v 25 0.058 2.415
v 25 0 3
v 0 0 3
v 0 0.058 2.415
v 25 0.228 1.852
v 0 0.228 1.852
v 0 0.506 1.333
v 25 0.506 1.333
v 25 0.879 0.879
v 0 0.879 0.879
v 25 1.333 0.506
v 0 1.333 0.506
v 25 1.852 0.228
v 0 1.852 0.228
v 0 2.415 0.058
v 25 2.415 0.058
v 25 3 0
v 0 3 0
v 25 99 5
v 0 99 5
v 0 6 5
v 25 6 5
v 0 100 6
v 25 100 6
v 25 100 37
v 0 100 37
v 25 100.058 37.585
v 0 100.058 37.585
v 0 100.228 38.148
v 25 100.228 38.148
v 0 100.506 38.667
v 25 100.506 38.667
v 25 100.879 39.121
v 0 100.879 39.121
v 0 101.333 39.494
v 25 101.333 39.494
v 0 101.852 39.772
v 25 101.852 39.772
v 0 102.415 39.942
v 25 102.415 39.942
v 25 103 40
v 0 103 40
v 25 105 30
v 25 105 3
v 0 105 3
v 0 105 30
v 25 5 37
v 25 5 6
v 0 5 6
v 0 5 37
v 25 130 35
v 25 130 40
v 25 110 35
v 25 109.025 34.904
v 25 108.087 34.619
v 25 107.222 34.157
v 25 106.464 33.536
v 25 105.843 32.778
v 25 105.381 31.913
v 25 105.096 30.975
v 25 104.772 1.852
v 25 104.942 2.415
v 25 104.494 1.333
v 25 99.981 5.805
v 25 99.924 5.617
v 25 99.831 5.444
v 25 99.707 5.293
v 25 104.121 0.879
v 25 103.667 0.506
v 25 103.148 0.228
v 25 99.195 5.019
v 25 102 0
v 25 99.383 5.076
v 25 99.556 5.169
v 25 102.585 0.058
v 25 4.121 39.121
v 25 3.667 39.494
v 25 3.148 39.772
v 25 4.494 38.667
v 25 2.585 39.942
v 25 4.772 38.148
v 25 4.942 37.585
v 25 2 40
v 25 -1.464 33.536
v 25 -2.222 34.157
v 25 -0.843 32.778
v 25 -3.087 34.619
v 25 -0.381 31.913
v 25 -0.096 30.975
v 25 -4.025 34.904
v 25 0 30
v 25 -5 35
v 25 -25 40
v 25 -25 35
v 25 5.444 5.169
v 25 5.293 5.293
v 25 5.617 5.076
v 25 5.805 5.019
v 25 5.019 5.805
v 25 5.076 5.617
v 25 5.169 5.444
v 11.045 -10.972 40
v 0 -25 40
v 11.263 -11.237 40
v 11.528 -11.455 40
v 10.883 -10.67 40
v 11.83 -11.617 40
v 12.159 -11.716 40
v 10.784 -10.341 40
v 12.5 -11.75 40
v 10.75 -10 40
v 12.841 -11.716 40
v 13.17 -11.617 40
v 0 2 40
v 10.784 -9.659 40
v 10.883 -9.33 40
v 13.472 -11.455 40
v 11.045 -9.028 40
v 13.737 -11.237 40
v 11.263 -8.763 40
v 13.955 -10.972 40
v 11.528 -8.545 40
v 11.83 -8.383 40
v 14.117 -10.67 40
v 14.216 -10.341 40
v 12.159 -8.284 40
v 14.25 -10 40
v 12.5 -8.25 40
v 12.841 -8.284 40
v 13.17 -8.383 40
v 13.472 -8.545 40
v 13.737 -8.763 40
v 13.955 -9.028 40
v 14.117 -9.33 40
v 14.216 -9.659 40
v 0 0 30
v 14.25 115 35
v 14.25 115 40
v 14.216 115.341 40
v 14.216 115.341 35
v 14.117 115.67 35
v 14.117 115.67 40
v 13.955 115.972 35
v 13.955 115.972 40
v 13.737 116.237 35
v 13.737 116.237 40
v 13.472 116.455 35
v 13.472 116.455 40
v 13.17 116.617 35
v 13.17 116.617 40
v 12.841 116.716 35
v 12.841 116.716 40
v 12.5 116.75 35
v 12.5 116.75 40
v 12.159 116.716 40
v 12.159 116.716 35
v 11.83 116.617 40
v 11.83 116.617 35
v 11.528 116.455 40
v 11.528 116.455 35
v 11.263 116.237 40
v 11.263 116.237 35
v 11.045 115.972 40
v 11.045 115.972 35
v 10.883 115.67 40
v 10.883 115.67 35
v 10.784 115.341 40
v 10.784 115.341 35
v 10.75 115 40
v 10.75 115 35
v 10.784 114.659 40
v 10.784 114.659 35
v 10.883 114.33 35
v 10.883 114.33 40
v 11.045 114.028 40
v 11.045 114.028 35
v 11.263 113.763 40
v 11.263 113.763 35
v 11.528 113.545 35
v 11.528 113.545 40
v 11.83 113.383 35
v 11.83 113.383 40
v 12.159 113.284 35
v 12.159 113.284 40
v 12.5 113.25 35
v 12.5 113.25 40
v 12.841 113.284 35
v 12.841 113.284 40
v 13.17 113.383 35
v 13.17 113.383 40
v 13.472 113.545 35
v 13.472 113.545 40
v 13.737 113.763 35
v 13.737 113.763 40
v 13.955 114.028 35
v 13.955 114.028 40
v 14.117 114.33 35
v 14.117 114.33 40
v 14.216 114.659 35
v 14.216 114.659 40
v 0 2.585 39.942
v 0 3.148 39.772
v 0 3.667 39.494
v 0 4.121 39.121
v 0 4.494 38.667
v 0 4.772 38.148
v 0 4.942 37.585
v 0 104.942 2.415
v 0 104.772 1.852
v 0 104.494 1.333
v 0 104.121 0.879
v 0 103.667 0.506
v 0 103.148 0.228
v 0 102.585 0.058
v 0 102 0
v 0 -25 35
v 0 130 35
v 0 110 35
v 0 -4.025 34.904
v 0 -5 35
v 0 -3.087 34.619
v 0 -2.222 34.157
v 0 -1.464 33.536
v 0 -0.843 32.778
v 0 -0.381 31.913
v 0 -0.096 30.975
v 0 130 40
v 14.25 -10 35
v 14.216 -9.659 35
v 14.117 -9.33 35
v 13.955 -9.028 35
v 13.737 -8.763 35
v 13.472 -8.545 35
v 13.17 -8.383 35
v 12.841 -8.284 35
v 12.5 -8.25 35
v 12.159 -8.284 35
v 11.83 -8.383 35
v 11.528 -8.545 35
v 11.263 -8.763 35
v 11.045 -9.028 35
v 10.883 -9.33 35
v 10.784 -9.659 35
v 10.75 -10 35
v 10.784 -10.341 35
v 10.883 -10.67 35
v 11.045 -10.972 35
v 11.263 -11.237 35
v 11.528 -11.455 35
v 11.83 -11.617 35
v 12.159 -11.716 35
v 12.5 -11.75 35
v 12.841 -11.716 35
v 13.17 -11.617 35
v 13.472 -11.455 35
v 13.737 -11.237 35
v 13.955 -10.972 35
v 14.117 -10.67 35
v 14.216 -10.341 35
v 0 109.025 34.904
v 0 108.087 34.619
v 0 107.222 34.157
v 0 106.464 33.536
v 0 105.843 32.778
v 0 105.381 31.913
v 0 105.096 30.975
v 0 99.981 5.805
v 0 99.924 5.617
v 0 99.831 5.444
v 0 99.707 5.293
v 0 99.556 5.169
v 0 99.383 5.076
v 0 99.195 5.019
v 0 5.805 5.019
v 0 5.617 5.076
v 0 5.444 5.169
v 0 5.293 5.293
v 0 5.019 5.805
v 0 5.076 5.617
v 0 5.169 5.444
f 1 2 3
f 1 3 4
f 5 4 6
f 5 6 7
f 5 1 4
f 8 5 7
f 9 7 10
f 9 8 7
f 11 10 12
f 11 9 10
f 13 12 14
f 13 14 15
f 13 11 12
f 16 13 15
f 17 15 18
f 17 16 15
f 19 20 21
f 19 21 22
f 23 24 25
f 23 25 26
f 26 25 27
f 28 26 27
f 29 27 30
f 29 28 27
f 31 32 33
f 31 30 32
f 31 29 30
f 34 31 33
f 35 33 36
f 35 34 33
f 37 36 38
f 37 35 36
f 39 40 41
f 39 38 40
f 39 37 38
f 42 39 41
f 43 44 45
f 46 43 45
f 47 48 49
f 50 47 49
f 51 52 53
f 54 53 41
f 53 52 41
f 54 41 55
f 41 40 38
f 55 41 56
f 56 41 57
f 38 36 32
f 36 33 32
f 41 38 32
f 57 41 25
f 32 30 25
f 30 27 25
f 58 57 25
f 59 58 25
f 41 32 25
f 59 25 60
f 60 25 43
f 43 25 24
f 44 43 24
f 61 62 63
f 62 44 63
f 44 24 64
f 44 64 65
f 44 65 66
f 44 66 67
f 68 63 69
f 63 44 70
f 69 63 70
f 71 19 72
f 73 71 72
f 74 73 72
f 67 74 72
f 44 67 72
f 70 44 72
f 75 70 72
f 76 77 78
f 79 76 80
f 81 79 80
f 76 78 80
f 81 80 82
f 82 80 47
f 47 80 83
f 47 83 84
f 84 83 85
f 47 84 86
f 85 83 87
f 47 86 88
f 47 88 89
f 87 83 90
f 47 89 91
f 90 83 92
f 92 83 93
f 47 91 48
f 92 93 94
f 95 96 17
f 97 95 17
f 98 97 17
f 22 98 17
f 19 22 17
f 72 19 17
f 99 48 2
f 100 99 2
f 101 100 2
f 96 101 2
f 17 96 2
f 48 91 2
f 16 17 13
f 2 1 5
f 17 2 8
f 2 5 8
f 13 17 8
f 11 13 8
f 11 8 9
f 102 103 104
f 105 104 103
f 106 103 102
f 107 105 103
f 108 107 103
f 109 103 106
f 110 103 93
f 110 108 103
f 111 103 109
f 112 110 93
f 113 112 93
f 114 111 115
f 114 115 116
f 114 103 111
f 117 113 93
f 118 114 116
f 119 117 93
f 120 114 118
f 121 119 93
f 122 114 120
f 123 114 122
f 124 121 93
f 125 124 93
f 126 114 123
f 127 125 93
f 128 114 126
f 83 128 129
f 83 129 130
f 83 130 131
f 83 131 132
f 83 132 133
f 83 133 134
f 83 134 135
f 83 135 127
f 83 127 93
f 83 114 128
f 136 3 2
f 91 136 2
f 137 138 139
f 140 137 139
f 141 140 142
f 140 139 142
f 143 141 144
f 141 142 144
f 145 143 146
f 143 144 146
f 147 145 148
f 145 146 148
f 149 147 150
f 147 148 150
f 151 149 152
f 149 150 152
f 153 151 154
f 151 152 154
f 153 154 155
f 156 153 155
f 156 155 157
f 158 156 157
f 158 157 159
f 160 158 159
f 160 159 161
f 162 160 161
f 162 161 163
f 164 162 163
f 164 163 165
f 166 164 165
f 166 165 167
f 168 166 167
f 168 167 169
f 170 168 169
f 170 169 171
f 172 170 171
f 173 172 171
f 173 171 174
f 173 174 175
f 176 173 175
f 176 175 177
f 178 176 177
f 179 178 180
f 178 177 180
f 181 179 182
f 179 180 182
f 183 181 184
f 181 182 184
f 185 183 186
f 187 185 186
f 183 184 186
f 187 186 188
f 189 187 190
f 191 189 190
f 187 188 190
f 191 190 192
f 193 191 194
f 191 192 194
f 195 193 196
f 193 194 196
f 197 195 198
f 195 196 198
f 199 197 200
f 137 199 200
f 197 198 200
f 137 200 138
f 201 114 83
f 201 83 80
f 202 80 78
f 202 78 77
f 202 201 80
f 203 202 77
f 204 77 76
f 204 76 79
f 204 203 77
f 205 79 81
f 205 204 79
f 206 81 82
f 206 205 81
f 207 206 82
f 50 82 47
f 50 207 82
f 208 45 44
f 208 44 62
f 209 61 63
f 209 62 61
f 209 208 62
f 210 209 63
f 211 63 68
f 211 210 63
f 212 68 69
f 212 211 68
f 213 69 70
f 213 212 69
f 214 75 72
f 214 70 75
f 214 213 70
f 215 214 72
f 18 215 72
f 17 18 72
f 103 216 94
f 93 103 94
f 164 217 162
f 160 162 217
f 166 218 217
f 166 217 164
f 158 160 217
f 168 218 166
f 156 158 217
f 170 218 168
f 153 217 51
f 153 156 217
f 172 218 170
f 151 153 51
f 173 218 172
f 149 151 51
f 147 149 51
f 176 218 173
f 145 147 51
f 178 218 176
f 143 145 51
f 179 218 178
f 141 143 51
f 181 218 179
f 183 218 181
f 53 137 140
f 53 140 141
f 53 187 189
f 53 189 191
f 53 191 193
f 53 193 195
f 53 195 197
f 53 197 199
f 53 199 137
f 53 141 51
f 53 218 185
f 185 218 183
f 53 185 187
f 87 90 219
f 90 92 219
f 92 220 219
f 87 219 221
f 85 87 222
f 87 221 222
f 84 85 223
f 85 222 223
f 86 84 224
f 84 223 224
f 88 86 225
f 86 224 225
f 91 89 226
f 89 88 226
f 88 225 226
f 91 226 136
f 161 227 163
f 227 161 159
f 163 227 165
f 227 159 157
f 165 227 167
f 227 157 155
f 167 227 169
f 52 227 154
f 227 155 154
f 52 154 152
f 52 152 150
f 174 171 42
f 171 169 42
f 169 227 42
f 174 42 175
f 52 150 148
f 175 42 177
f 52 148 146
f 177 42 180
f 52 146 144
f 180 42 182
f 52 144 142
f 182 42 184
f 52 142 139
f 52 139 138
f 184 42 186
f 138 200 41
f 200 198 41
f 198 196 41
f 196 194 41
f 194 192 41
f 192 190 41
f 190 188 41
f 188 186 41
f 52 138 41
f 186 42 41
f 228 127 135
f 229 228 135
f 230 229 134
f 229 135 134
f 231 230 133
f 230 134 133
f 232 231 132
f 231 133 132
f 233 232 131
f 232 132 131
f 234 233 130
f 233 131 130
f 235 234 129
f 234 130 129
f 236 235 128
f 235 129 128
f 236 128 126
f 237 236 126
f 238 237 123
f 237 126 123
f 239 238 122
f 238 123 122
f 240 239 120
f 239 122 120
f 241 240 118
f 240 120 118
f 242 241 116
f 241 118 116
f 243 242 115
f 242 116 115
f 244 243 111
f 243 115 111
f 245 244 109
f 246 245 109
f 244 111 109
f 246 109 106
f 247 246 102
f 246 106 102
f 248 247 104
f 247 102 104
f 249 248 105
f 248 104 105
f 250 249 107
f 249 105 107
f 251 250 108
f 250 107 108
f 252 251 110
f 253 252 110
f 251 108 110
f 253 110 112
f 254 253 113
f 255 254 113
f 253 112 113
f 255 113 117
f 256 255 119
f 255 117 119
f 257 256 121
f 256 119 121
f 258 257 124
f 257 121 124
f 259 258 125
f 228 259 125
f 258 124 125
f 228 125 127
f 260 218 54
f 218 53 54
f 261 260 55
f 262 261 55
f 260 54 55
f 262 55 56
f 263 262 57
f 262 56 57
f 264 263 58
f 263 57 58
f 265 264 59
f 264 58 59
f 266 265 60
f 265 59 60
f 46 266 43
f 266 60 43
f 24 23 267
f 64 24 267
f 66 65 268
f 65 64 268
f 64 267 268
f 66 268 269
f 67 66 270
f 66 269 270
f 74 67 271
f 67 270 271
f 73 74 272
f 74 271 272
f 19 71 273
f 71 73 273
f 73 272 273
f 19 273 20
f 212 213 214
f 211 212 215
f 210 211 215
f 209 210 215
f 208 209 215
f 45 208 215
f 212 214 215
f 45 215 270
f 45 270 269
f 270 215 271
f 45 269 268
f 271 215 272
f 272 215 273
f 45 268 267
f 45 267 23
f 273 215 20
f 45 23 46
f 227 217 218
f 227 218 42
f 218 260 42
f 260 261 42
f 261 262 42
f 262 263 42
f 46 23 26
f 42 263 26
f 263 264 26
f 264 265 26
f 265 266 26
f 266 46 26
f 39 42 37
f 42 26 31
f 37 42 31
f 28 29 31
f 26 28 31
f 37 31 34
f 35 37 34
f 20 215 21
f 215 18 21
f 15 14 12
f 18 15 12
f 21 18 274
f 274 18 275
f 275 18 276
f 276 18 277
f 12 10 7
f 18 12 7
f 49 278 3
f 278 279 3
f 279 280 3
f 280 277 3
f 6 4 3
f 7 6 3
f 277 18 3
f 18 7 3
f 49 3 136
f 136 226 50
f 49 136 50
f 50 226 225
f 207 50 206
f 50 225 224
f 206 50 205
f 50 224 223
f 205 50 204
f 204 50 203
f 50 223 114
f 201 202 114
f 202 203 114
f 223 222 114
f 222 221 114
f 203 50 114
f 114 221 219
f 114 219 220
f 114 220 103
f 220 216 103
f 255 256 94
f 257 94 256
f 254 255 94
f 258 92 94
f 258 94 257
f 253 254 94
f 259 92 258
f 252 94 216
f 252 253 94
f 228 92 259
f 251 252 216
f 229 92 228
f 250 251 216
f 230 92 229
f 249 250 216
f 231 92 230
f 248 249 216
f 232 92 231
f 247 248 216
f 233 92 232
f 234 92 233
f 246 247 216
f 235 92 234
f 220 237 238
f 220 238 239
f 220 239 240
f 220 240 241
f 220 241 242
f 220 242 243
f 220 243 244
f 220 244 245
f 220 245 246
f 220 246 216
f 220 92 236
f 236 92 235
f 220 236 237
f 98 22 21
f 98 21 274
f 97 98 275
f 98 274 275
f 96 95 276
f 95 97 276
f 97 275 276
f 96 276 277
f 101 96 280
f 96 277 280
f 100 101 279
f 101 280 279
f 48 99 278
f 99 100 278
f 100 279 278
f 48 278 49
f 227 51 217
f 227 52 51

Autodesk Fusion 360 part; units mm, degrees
sketch "Boceto1" plane through (0, 0, 0) normal (0, 1, 0) x (1, 0, 0)
sketch "Boceto2" plane through (0, 0, 0) normal (0, 0, 1) x (1, 0, 0)
  line L0 (0, 0) -> (0, 90)
  line L1 (0, 90) -> (25, 90)
  line L2 (0, 0) -> (25, 0)
  line L3 (25, 0) -> (25, 90)
  line L4 (25, 90) -> (25, 92)
  line L5 (25, 90) -> (25, 105)
  line L6 (25, 105) -> (0, 105)
  line L7 (0, 105) -> (0, 90)
  dimension "d1" = 90
  dimension "d2" = 25
  dimension "d4" = 15
extrude "Extruir1" add sketch "Boceto2" along normal blind 5
sketch "Boceto3" plane through (0, 0, 5) normal (0, 0, 1) x (1, 0, 0)
  line L0 (0, 0) -> (25, 0)
  line L1 (25, 0) -> (25, 105)
  line L2 (25, 105) -> (0, 105)
  line L3 (0, 105) -> (0, 0)
  line L4 (0, 0) -> (25, 0)
  line L5 (25, 0) -> (25, 5)
  line L6 (25, 5) -> (0, 5)
  line L7 (0, 5) -> (0, 0)
  line L8 (0, 105) -> (25, 105)
  line L9 (25, 105) -> (25, 100)
  line L10 (25, 100) -> (0, 100)
  line L11 (0, 100) -> (0, 105)
  dimension "d7" = 5
  dimension "d8" = 5
extrude "Extruir2" add sketch "Boceto3" along normal blind 35 contours L0 L1 L3 L4 L5 L6 L7 | L1 L2 L3 L8 L9 L10 L11
sketch "Boceto4" plane through (0, 0, 0) normal (0, 1, 0) x (1, 0, 0)
  line L0 (0, -40) -> (25, -40)
  line L1 (25, -40) -> (25, -35)
  line L2 (25, -35) -> (0, -35)
  line L3 (0, -35) -> (0, -40)
  dimension "d11" = 5
extrude "Extruir3" add sketch "Boceto4" against normal blind 25
sketch "Boceto5" plane through (0, 105, 0) normal (0, 1, 0) x (-1, 0, 0)
  line L0 (-25, 0) -> (0, 0)
  line L1 (0, 0) -> (0, 40)
  line L2 (0, 40) -> (-25, 40)
  line L3 (-25, 40) -> (-25, 0)
  line L4 (-25, 40) -> (0, 40)
  line L5 (0, 40) -> (0, 35)
  line L6 (0, 35) -> (-25, 35)
  line L7 (-25, 35) -> (-25, 40)
extrude "Extruir4" add sketch "Boceto5" along normal blind 25 contours L1 L2 L3 L4 L5 L6 L7
sketch "Boceto6" plane through (0, 0, 40) normal (0, 0, 1) x (1, 0, 0)
  line L0 (0, 100) -> (25, 100)
  line L1 (25, 100) -> (25, 130)
  line L2 (25, 130) -> (0, 130)
  line L3 (0, 130) -> (0, 100)
  line L4 (12.5, 130) -> (12.5, 115)
  circle A0 centre (12.5, 115) radius 1.75
  line L5 (0, 50) -> (30, 50)
  line L6 (0, -25) -> (25, -25)
  line L7 (12.5, -25) -> (12.5, -10)
  circle A1 centre (12.5, -10) radius 1.75
  dimension "d16" = 3.5
  dimension "d17" = 3.5
extrude "Extruir5" cut sketch "Boceto6" against normal blind 5 contours A0 | A1
fillet "Empalme1" radius 5 1 edges at (12.5, 105, 35)
fillet "Empalme2" radius 5 1 edges at (12.5, 0, 35)
fillet "Empalme3" radius 3 4 edges at (12.5, 0, 0) (12.5, 105, 0) (12.5, 100, 40) (12.5, 5, 40)
fillet "Empalme4" radius 1 2 edges at (12.5, 5, 5) (12.5, 100, 5)
